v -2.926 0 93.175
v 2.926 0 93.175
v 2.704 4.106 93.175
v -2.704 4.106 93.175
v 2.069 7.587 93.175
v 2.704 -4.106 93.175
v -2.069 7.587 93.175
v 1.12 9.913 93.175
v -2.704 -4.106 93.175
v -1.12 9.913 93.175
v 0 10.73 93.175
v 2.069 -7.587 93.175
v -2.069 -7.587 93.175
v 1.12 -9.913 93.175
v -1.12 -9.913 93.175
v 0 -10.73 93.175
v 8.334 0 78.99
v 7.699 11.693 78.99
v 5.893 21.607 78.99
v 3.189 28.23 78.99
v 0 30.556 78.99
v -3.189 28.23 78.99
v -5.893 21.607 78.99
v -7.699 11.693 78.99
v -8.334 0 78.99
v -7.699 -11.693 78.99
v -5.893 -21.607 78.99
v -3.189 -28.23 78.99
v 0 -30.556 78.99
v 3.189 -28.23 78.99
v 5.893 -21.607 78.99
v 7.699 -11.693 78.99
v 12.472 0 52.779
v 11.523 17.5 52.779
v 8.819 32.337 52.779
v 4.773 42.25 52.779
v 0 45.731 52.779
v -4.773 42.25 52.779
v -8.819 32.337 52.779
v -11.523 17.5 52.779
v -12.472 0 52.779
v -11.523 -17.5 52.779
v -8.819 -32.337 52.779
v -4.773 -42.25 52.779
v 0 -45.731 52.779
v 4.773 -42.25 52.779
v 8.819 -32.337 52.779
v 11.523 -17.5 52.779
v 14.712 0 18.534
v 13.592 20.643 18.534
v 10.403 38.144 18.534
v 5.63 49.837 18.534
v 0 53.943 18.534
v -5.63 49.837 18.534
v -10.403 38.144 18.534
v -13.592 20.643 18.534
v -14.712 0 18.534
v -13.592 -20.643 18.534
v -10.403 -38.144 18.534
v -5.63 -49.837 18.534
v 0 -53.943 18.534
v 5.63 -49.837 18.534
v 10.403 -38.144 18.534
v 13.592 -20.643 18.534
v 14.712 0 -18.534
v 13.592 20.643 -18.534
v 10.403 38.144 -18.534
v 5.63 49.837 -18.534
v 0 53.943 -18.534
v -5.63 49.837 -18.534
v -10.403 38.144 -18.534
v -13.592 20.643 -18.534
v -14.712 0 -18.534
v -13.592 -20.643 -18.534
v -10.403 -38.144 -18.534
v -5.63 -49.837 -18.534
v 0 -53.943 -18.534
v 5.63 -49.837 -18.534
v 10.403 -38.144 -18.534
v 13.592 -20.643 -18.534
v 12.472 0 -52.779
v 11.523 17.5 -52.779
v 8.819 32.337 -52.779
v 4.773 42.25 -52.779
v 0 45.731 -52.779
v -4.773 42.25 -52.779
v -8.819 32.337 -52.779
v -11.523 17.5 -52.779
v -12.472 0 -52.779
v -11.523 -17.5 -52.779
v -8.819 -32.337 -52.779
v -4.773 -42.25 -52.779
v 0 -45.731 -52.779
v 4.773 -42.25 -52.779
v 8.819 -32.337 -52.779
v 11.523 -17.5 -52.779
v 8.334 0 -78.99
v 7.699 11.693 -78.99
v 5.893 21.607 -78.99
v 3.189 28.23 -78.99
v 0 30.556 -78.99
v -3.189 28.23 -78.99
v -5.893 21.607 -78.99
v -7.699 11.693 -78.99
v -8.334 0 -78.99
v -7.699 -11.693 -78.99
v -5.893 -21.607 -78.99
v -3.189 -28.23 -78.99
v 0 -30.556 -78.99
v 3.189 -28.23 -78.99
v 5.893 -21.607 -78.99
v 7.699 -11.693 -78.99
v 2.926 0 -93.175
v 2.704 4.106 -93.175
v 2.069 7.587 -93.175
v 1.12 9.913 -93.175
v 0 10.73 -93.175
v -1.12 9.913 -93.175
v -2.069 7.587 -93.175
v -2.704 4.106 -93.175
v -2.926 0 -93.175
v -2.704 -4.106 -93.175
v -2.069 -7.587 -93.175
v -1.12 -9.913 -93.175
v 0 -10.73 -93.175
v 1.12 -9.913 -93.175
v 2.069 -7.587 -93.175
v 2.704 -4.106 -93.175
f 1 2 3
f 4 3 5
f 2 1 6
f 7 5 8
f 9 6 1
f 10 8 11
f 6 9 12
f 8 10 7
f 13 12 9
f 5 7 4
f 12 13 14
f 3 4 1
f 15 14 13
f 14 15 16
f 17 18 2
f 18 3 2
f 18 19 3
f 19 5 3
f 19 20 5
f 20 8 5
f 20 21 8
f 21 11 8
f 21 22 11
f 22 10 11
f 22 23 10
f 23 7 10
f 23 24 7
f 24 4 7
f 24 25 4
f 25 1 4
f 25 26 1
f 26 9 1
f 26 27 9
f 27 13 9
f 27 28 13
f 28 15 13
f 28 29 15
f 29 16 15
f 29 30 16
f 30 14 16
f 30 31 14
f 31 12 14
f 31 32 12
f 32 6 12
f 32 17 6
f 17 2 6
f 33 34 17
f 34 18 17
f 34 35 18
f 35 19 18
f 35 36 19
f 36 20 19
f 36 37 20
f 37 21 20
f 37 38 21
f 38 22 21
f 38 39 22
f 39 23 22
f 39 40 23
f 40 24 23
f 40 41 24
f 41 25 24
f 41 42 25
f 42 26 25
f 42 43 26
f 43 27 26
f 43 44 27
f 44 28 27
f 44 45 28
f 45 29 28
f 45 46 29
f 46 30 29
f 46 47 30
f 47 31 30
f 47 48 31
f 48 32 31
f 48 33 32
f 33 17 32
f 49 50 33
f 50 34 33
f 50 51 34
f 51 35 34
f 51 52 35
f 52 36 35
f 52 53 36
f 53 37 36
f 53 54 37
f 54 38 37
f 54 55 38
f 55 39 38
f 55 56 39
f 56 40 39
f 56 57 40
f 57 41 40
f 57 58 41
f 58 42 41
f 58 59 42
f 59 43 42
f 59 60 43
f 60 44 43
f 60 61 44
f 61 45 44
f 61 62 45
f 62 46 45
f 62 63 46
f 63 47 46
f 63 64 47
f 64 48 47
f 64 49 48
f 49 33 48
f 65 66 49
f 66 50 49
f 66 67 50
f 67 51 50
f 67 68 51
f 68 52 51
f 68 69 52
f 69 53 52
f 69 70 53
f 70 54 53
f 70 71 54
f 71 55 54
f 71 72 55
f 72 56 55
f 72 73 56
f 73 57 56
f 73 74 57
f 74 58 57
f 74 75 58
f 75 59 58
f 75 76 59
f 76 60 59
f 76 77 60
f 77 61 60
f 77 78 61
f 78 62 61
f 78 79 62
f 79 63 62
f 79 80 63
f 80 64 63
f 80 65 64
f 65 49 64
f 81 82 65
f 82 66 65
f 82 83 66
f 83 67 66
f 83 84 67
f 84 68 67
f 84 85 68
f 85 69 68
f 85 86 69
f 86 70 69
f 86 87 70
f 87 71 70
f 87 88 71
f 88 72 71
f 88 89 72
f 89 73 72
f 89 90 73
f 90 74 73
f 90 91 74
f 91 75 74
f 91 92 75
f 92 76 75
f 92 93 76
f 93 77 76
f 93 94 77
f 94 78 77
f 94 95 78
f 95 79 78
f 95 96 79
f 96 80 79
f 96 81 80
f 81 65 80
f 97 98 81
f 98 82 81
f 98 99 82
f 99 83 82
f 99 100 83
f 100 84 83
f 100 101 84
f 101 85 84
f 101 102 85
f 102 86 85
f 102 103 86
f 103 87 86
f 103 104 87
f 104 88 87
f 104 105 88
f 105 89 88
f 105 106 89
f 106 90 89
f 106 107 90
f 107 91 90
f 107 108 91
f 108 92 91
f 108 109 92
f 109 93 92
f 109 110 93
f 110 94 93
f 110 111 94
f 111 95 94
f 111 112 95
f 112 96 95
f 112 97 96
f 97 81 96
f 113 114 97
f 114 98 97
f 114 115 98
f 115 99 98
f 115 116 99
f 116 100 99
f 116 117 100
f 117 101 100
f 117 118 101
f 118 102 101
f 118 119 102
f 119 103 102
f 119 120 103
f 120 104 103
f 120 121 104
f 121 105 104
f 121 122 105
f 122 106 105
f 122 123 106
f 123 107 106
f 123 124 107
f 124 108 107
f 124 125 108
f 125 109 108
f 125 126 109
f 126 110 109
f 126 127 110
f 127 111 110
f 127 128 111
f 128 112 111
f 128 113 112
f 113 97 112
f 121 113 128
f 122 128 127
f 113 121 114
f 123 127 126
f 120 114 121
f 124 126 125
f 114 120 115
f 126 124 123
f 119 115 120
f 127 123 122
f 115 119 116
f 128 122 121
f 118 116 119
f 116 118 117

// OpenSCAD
// Generated by SolidPython 1.0.1 on 2020-07-29 00:46:45


scale(v = [3, 11, 19]) {
	sphere(r = 5);
}
/***********************************************
*********      SolidPython code:      **********
************************************************
 
# import packages: SolidPython
from solid import *
from solid.utils import *
from itertools import chain, combinations, permutations


class Resize:

    def __init__(self, scad_file):
        self.scad_file = scad_file
        #self.scad_file = import_scad(scad_file)
        # cone/cylinder param:
        self.r1 = 0
        self.r2 = 0
        self.h = 0
        # rectangular prism param:
        self.w = 0
        self.l = 0
        # ellipse param:
        self.r = 0

    # import OpenScad code (file name corresponds to shape)


    # classify shape + parameters
    def assign(self, param1, param2, param3):
        if self.scad_file == 'cone.scad':
            self.r1 = param1
            self.r2 = param2
            self.h = param3
        elif self.scad_file == 'cylinder.scad':
            self.r1 = param1
            self.r2 = param2
            self.h = param3
        elif self.scad_file == 'rectangularPrism.scad':
            self.h = param1
            self.l = param2
            self.w = param3
        else:
            self.r = param1
            self.h = param2

    # resize parameters
    def iterate(self):
        x = range(3, 20, 2)
        i = 1
        if self.scad_file == 'cone.scad':
            tempList = list(permutations(x, 2))
            for temp in tempList:
                param1 = temp[0]
                param2 = temp[1]
                filepath = 'produced_scad_files/' + 'cone' + str(param1) + '_' + str(param2) + '_' + '.scad'
                scad_render_to_file(cylinder(h=param1, r1=param2, r2=0), filepath)

        elif self.scad_file == 'cylinder.scad':
            tempList = list(permutations(x, 3))
            for temp in tempList:
                param1 = temp[0]
                param2 = temp[1]
                filepath = 'produced_scad_files/' + 'cylinder' + str(param1) + '_' + str(param2) + '_' + '.scad'
                scad_render_to_file(cylinder(h=param1, r1=param2, r2=param2), filepath)

        elif self.scad_file == 'rectangularPrism.scad':
            tempList = list(permutations(x, 3))
            for temp in tempList:
                param1 = temp[0]
                param2 = temp[1]
                param3 = temp[2]
                filepath = 'produced_scad_files/' + 'rectangularPrism' + str(param1) + '_' + str(param2) + '_' + str(
                    param3) + '.scad'
                scad_render_to_file(cube(size=(param1, param2, param3)), filepath)

        elif self.scad_file == 'ellipse.scad':
            tempList = list(permutations(x, 4))
            for temp in tempList:
                param1 = temp[0]
                param2 = temp[1]
                param3 = temp[2]
                param4 = temp[3]
                filepath = 'produced_scad_files/' + 'ellipse' + str(param1) + '_' + str(param2) + '_' + str(param3) + '_' + str(param4) + '.scad'
                scad_render_to_file(scale([param1, param2, param3])(sphere(r=param4)), filepath)

    def render_to_scadfile(self):
        scad_render_to_file(scad, 'example.scad') 
 
************************************************/
